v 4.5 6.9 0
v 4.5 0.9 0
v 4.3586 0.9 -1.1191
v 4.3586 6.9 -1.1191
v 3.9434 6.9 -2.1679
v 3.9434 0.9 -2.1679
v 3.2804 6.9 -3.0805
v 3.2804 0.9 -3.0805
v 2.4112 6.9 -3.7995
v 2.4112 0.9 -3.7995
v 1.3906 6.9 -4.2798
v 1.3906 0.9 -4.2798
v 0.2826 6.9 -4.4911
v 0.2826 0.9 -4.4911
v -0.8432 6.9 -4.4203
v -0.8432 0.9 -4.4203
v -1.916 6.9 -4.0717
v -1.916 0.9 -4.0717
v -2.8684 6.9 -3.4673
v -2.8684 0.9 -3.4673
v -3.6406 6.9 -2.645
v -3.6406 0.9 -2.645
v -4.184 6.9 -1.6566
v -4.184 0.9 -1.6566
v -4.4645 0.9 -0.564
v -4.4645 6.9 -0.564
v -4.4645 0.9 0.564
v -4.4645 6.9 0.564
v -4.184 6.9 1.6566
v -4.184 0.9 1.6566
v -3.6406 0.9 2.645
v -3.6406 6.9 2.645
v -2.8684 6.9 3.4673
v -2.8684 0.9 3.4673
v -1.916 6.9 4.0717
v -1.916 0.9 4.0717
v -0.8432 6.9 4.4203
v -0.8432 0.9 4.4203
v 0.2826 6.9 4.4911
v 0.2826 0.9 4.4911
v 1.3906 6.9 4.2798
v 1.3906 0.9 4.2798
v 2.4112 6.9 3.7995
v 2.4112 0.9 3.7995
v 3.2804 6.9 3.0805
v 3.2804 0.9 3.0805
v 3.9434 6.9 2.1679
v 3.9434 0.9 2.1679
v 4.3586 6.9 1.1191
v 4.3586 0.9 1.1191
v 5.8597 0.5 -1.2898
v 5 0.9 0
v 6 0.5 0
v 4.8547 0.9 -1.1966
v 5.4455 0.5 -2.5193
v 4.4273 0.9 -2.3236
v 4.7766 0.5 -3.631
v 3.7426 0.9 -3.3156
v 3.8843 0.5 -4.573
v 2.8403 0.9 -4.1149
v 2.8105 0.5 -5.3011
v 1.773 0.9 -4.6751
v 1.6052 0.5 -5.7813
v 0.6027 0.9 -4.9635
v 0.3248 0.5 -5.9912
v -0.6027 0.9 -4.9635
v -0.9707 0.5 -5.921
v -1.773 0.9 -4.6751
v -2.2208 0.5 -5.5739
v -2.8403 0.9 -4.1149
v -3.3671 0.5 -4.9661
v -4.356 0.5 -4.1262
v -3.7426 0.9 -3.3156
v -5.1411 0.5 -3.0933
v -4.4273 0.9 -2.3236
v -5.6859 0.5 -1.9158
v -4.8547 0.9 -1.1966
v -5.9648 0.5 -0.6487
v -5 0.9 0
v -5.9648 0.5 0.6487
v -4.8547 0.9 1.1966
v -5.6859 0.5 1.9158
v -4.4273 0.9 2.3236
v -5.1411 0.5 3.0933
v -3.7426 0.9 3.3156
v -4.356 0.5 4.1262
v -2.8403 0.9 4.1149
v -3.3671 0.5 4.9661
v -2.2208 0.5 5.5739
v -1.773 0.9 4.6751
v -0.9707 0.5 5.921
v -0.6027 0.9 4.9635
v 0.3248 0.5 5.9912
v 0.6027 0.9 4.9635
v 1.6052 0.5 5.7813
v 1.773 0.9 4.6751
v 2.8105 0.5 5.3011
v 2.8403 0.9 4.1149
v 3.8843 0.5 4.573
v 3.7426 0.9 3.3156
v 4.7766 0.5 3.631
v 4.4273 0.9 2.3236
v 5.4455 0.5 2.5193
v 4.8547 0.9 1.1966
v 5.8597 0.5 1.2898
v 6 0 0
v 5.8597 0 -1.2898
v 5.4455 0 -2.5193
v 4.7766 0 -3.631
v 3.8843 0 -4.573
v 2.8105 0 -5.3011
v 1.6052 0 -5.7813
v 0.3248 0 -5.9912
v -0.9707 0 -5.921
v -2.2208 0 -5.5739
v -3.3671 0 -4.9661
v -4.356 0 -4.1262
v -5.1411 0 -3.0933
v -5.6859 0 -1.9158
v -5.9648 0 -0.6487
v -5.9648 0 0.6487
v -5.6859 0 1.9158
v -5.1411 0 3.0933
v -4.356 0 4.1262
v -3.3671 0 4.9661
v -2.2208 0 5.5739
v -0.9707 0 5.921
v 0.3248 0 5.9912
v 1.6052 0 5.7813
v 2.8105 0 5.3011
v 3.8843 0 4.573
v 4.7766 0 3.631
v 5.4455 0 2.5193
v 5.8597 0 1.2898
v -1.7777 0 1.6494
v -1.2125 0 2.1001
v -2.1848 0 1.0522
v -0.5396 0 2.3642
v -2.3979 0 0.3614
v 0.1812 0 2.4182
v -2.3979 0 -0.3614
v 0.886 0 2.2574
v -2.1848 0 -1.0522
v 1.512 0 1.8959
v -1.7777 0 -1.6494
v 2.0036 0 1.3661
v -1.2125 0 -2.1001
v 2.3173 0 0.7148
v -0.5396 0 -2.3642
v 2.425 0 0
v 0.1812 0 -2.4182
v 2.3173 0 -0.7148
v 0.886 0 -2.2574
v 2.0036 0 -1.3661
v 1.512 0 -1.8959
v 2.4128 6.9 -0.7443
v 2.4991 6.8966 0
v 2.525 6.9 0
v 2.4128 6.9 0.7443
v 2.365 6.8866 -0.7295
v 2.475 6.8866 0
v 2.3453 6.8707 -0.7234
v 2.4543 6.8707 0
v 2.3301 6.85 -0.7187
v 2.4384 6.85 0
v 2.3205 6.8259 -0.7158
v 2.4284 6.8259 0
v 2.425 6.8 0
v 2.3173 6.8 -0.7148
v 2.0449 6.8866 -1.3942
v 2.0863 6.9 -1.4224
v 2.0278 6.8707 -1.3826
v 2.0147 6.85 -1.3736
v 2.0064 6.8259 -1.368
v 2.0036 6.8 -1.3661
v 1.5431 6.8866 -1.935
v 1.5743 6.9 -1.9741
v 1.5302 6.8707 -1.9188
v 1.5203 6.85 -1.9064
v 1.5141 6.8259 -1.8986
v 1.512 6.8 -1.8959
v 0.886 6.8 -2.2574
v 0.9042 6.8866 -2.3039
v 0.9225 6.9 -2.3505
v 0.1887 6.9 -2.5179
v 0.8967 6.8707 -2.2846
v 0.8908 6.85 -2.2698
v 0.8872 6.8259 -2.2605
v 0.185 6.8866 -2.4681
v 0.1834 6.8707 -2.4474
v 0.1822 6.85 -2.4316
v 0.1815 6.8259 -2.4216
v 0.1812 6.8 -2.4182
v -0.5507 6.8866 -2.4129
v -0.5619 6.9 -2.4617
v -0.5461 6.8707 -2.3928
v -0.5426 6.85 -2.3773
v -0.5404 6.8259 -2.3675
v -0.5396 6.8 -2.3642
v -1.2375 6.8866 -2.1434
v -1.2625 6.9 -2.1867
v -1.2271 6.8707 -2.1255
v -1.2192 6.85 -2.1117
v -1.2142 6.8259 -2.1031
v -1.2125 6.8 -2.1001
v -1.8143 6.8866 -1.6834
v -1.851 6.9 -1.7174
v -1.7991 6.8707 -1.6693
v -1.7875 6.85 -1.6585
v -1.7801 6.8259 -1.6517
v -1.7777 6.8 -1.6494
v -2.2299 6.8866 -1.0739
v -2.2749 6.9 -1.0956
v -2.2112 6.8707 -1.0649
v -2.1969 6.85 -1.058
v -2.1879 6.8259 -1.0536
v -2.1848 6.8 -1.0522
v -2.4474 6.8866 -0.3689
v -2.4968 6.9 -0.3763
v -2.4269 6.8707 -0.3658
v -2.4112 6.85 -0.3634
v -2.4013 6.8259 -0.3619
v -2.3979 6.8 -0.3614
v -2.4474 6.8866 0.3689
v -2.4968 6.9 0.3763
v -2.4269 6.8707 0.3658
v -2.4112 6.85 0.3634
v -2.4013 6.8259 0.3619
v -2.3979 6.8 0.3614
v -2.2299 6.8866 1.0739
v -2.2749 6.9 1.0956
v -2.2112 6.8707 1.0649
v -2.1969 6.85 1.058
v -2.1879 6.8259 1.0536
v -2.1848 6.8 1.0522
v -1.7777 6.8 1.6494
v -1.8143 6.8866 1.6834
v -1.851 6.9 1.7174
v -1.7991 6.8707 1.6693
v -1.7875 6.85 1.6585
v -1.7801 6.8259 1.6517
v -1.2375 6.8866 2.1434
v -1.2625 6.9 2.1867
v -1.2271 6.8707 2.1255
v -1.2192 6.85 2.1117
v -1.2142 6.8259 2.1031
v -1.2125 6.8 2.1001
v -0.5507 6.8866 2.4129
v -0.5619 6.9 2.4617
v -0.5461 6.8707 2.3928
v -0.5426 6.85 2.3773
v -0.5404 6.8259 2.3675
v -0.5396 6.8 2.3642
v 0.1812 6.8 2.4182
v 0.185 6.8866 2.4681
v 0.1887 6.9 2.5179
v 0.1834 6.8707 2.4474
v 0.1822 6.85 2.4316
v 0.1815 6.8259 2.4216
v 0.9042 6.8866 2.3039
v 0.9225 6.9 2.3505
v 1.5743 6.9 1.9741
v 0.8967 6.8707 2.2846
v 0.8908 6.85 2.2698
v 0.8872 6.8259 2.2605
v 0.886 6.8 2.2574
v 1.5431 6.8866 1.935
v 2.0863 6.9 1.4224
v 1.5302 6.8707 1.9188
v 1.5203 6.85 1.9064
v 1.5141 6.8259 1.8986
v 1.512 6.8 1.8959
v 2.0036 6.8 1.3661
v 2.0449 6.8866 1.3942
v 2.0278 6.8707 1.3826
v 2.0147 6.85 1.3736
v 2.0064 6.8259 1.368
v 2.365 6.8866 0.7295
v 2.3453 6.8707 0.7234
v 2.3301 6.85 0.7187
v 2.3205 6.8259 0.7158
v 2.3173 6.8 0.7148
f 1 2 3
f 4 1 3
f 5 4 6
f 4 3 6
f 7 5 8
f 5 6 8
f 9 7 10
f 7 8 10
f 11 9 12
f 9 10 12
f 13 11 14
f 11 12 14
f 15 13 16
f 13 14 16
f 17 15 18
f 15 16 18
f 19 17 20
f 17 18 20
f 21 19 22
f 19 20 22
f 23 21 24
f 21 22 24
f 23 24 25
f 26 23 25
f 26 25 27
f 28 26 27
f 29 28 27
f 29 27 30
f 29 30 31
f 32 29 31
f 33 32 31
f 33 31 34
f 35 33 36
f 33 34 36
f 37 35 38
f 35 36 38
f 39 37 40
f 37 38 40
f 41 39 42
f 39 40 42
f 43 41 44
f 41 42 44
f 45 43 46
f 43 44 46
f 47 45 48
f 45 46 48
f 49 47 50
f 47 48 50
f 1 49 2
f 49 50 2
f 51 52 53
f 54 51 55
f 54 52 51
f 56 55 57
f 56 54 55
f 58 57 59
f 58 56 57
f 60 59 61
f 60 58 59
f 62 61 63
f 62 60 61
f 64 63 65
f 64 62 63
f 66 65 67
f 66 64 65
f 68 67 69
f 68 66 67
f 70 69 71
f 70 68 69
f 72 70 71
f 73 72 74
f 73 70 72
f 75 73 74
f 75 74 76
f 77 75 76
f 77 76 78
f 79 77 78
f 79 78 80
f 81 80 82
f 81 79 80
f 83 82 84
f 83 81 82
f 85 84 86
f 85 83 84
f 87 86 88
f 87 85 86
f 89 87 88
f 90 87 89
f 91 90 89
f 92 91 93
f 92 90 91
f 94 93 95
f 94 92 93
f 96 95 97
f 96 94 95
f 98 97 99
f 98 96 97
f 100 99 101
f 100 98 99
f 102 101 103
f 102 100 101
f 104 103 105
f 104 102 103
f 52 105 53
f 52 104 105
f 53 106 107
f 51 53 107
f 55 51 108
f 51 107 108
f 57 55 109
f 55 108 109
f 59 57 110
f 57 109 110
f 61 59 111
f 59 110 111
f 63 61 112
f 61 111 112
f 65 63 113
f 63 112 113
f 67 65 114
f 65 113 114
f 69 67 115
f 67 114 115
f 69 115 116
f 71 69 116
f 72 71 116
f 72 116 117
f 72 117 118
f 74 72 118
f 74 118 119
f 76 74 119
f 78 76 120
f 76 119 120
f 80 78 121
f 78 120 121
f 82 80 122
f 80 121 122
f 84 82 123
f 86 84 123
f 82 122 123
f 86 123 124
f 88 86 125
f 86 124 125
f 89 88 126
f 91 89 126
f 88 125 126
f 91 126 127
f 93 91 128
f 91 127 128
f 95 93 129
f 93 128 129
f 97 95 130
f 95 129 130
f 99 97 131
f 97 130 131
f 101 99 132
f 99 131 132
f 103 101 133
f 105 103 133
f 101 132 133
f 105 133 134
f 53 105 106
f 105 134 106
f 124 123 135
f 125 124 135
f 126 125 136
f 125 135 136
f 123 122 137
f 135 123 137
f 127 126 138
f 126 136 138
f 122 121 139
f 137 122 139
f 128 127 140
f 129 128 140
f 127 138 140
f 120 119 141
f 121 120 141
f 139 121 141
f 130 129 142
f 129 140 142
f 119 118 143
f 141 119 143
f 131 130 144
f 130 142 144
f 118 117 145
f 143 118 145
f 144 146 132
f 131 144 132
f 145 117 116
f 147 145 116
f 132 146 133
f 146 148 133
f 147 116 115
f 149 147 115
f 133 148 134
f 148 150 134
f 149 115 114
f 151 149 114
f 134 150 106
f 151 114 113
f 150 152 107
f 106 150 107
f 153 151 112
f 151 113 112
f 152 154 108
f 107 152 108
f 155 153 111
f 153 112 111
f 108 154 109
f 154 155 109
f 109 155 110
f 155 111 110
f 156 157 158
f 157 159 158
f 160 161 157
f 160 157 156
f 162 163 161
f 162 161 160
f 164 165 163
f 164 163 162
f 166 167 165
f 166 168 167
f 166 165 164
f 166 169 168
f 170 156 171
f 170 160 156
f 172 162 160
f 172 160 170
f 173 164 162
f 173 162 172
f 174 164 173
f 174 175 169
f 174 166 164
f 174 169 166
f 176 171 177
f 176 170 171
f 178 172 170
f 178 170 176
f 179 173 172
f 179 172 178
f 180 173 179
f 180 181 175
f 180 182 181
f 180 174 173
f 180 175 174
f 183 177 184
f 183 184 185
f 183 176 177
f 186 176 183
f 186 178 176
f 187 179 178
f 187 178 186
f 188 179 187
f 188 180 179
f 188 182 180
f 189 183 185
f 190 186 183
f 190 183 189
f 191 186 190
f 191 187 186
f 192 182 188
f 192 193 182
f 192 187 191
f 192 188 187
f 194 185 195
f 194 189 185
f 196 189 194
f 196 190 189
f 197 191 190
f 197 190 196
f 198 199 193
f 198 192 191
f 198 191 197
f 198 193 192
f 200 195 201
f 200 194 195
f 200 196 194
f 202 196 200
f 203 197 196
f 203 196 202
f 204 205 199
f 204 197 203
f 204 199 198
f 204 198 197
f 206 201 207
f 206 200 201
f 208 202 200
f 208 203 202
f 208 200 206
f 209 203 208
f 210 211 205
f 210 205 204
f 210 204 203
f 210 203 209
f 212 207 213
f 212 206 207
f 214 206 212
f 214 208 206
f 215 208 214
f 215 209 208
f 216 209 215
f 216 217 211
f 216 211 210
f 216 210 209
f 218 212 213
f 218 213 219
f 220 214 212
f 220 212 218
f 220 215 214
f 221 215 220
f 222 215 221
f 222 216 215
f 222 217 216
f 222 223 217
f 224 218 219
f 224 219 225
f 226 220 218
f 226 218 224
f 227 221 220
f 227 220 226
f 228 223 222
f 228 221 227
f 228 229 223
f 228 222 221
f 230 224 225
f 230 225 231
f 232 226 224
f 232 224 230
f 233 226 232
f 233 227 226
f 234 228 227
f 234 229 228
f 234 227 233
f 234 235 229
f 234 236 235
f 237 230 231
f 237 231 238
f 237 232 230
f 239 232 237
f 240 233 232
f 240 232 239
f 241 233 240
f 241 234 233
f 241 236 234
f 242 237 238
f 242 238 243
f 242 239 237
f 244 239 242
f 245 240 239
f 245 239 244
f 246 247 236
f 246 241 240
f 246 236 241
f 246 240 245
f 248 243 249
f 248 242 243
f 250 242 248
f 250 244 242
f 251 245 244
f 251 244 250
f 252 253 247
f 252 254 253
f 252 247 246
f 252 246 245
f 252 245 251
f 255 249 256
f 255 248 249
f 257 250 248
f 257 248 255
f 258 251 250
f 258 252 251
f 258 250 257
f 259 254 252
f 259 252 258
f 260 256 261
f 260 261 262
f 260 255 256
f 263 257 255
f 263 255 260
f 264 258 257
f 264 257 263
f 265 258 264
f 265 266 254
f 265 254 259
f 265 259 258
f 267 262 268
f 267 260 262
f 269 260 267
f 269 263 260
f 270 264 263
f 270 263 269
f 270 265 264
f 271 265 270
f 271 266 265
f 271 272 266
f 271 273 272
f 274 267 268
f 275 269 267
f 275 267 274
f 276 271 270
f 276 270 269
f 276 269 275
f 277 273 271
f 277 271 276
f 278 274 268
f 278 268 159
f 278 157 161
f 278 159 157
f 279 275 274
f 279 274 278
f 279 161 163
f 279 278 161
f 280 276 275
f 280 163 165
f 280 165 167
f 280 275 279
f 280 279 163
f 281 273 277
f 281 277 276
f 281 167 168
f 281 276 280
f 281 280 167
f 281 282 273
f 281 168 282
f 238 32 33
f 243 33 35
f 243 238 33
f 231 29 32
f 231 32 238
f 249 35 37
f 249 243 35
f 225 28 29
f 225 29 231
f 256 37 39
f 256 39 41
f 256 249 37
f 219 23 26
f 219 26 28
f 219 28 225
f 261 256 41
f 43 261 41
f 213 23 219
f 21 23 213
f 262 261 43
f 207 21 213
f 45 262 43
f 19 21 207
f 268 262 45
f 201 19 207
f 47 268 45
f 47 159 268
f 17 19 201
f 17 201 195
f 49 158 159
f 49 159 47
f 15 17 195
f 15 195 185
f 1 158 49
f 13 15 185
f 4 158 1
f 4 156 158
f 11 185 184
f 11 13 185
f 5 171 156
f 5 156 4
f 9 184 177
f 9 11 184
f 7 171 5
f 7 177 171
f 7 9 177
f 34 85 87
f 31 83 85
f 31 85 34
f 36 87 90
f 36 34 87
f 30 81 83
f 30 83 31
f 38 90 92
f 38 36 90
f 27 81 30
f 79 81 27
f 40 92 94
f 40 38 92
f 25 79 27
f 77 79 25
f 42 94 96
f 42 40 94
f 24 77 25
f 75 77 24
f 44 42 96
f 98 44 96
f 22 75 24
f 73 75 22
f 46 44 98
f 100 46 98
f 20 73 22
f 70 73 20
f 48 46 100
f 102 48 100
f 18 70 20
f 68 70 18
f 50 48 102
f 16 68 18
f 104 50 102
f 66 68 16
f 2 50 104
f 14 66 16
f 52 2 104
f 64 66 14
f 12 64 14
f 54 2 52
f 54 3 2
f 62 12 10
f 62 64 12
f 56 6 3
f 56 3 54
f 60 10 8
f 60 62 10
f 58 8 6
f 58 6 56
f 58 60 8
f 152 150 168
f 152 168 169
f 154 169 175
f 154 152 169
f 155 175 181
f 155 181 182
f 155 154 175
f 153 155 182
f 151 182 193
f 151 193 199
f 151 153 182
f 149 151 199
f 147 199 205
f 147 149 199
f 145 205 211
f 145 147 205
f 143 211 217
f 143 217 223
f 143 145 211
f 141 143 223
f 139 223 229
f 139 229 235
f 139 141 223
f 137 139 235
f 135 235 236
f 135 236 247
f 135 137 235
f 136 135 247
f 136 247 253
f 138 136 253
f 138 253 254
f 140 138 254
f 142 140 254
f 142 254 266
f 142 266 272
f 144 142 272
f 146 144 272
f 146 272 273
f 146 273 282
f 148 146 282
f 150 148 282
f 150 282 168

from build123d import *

# Parameters (mm, degrees)
SKETCH_1_R      = 6
SKETCH_1_R_2    = 2.425
EXTRUDE_1_DEPTH = 0.9
SKETCH_2_R      = 4.5
SKETCH_2_R_2    = 2.425
EXTRUDE_2_DEPTH = 6
FILLET_1_R      = 0.1
CHAMFER_1_SIZE  = 0.4
CHAMFER_1_SIZE2 = 1


with BuildPart() as part:
    # 草图1 → 凸台-拉伸1 (new body)
    with BuildSketch(Plane(origin=(0, 0, 0), x_dir=(1, 0, 0), z_dir=(0, 1, 0))):
        Circle(SKETCH_1_R)
        Circle(SKETCH_1_R_2, mode=Mode.SUBTRACT)
    extrude(amount=EXTRUDE_1_DEPTH)

    # 草图2 → 凸台-拉伸2 (add)
    with BuildSketch(Plane(origin=(0, 0.9, 0), x_dir=(1, 0, 0), z_dir=(0, 1, 0))):
        Circle(SKETCH_2_R)
        Circle(SKETCH_2_R_2, mode=Mode.SUBTRACT)
    extrude(amount=EXTRUDE_2_DEPTH)

    # 圆角1
    fillet_1_edges = [part.edges().sort_by_distance(p)[0] for p in [
        (-2.425, 6.9, 0),
    ]]
    fillet(fillet_1_edges, radius=FILLET_1_R)

    # 倒角1
    chamfer_1_edges = [part.edges().sort_by_distance(p)[0] for p in [
        (-6, 0.9, 0),
    ]]
    chamfer_1_side = [part.faces().sort_by_distance(p)[0] for p in [
        (-6, 0.45, 0),
    ]]
    chamfer(chamfer_1_edges, length=CHAMFER_1_SIZE, length2=CHAMFER_1_SIZE2, reference=chamfer_1_side[0])


solid = part.part
